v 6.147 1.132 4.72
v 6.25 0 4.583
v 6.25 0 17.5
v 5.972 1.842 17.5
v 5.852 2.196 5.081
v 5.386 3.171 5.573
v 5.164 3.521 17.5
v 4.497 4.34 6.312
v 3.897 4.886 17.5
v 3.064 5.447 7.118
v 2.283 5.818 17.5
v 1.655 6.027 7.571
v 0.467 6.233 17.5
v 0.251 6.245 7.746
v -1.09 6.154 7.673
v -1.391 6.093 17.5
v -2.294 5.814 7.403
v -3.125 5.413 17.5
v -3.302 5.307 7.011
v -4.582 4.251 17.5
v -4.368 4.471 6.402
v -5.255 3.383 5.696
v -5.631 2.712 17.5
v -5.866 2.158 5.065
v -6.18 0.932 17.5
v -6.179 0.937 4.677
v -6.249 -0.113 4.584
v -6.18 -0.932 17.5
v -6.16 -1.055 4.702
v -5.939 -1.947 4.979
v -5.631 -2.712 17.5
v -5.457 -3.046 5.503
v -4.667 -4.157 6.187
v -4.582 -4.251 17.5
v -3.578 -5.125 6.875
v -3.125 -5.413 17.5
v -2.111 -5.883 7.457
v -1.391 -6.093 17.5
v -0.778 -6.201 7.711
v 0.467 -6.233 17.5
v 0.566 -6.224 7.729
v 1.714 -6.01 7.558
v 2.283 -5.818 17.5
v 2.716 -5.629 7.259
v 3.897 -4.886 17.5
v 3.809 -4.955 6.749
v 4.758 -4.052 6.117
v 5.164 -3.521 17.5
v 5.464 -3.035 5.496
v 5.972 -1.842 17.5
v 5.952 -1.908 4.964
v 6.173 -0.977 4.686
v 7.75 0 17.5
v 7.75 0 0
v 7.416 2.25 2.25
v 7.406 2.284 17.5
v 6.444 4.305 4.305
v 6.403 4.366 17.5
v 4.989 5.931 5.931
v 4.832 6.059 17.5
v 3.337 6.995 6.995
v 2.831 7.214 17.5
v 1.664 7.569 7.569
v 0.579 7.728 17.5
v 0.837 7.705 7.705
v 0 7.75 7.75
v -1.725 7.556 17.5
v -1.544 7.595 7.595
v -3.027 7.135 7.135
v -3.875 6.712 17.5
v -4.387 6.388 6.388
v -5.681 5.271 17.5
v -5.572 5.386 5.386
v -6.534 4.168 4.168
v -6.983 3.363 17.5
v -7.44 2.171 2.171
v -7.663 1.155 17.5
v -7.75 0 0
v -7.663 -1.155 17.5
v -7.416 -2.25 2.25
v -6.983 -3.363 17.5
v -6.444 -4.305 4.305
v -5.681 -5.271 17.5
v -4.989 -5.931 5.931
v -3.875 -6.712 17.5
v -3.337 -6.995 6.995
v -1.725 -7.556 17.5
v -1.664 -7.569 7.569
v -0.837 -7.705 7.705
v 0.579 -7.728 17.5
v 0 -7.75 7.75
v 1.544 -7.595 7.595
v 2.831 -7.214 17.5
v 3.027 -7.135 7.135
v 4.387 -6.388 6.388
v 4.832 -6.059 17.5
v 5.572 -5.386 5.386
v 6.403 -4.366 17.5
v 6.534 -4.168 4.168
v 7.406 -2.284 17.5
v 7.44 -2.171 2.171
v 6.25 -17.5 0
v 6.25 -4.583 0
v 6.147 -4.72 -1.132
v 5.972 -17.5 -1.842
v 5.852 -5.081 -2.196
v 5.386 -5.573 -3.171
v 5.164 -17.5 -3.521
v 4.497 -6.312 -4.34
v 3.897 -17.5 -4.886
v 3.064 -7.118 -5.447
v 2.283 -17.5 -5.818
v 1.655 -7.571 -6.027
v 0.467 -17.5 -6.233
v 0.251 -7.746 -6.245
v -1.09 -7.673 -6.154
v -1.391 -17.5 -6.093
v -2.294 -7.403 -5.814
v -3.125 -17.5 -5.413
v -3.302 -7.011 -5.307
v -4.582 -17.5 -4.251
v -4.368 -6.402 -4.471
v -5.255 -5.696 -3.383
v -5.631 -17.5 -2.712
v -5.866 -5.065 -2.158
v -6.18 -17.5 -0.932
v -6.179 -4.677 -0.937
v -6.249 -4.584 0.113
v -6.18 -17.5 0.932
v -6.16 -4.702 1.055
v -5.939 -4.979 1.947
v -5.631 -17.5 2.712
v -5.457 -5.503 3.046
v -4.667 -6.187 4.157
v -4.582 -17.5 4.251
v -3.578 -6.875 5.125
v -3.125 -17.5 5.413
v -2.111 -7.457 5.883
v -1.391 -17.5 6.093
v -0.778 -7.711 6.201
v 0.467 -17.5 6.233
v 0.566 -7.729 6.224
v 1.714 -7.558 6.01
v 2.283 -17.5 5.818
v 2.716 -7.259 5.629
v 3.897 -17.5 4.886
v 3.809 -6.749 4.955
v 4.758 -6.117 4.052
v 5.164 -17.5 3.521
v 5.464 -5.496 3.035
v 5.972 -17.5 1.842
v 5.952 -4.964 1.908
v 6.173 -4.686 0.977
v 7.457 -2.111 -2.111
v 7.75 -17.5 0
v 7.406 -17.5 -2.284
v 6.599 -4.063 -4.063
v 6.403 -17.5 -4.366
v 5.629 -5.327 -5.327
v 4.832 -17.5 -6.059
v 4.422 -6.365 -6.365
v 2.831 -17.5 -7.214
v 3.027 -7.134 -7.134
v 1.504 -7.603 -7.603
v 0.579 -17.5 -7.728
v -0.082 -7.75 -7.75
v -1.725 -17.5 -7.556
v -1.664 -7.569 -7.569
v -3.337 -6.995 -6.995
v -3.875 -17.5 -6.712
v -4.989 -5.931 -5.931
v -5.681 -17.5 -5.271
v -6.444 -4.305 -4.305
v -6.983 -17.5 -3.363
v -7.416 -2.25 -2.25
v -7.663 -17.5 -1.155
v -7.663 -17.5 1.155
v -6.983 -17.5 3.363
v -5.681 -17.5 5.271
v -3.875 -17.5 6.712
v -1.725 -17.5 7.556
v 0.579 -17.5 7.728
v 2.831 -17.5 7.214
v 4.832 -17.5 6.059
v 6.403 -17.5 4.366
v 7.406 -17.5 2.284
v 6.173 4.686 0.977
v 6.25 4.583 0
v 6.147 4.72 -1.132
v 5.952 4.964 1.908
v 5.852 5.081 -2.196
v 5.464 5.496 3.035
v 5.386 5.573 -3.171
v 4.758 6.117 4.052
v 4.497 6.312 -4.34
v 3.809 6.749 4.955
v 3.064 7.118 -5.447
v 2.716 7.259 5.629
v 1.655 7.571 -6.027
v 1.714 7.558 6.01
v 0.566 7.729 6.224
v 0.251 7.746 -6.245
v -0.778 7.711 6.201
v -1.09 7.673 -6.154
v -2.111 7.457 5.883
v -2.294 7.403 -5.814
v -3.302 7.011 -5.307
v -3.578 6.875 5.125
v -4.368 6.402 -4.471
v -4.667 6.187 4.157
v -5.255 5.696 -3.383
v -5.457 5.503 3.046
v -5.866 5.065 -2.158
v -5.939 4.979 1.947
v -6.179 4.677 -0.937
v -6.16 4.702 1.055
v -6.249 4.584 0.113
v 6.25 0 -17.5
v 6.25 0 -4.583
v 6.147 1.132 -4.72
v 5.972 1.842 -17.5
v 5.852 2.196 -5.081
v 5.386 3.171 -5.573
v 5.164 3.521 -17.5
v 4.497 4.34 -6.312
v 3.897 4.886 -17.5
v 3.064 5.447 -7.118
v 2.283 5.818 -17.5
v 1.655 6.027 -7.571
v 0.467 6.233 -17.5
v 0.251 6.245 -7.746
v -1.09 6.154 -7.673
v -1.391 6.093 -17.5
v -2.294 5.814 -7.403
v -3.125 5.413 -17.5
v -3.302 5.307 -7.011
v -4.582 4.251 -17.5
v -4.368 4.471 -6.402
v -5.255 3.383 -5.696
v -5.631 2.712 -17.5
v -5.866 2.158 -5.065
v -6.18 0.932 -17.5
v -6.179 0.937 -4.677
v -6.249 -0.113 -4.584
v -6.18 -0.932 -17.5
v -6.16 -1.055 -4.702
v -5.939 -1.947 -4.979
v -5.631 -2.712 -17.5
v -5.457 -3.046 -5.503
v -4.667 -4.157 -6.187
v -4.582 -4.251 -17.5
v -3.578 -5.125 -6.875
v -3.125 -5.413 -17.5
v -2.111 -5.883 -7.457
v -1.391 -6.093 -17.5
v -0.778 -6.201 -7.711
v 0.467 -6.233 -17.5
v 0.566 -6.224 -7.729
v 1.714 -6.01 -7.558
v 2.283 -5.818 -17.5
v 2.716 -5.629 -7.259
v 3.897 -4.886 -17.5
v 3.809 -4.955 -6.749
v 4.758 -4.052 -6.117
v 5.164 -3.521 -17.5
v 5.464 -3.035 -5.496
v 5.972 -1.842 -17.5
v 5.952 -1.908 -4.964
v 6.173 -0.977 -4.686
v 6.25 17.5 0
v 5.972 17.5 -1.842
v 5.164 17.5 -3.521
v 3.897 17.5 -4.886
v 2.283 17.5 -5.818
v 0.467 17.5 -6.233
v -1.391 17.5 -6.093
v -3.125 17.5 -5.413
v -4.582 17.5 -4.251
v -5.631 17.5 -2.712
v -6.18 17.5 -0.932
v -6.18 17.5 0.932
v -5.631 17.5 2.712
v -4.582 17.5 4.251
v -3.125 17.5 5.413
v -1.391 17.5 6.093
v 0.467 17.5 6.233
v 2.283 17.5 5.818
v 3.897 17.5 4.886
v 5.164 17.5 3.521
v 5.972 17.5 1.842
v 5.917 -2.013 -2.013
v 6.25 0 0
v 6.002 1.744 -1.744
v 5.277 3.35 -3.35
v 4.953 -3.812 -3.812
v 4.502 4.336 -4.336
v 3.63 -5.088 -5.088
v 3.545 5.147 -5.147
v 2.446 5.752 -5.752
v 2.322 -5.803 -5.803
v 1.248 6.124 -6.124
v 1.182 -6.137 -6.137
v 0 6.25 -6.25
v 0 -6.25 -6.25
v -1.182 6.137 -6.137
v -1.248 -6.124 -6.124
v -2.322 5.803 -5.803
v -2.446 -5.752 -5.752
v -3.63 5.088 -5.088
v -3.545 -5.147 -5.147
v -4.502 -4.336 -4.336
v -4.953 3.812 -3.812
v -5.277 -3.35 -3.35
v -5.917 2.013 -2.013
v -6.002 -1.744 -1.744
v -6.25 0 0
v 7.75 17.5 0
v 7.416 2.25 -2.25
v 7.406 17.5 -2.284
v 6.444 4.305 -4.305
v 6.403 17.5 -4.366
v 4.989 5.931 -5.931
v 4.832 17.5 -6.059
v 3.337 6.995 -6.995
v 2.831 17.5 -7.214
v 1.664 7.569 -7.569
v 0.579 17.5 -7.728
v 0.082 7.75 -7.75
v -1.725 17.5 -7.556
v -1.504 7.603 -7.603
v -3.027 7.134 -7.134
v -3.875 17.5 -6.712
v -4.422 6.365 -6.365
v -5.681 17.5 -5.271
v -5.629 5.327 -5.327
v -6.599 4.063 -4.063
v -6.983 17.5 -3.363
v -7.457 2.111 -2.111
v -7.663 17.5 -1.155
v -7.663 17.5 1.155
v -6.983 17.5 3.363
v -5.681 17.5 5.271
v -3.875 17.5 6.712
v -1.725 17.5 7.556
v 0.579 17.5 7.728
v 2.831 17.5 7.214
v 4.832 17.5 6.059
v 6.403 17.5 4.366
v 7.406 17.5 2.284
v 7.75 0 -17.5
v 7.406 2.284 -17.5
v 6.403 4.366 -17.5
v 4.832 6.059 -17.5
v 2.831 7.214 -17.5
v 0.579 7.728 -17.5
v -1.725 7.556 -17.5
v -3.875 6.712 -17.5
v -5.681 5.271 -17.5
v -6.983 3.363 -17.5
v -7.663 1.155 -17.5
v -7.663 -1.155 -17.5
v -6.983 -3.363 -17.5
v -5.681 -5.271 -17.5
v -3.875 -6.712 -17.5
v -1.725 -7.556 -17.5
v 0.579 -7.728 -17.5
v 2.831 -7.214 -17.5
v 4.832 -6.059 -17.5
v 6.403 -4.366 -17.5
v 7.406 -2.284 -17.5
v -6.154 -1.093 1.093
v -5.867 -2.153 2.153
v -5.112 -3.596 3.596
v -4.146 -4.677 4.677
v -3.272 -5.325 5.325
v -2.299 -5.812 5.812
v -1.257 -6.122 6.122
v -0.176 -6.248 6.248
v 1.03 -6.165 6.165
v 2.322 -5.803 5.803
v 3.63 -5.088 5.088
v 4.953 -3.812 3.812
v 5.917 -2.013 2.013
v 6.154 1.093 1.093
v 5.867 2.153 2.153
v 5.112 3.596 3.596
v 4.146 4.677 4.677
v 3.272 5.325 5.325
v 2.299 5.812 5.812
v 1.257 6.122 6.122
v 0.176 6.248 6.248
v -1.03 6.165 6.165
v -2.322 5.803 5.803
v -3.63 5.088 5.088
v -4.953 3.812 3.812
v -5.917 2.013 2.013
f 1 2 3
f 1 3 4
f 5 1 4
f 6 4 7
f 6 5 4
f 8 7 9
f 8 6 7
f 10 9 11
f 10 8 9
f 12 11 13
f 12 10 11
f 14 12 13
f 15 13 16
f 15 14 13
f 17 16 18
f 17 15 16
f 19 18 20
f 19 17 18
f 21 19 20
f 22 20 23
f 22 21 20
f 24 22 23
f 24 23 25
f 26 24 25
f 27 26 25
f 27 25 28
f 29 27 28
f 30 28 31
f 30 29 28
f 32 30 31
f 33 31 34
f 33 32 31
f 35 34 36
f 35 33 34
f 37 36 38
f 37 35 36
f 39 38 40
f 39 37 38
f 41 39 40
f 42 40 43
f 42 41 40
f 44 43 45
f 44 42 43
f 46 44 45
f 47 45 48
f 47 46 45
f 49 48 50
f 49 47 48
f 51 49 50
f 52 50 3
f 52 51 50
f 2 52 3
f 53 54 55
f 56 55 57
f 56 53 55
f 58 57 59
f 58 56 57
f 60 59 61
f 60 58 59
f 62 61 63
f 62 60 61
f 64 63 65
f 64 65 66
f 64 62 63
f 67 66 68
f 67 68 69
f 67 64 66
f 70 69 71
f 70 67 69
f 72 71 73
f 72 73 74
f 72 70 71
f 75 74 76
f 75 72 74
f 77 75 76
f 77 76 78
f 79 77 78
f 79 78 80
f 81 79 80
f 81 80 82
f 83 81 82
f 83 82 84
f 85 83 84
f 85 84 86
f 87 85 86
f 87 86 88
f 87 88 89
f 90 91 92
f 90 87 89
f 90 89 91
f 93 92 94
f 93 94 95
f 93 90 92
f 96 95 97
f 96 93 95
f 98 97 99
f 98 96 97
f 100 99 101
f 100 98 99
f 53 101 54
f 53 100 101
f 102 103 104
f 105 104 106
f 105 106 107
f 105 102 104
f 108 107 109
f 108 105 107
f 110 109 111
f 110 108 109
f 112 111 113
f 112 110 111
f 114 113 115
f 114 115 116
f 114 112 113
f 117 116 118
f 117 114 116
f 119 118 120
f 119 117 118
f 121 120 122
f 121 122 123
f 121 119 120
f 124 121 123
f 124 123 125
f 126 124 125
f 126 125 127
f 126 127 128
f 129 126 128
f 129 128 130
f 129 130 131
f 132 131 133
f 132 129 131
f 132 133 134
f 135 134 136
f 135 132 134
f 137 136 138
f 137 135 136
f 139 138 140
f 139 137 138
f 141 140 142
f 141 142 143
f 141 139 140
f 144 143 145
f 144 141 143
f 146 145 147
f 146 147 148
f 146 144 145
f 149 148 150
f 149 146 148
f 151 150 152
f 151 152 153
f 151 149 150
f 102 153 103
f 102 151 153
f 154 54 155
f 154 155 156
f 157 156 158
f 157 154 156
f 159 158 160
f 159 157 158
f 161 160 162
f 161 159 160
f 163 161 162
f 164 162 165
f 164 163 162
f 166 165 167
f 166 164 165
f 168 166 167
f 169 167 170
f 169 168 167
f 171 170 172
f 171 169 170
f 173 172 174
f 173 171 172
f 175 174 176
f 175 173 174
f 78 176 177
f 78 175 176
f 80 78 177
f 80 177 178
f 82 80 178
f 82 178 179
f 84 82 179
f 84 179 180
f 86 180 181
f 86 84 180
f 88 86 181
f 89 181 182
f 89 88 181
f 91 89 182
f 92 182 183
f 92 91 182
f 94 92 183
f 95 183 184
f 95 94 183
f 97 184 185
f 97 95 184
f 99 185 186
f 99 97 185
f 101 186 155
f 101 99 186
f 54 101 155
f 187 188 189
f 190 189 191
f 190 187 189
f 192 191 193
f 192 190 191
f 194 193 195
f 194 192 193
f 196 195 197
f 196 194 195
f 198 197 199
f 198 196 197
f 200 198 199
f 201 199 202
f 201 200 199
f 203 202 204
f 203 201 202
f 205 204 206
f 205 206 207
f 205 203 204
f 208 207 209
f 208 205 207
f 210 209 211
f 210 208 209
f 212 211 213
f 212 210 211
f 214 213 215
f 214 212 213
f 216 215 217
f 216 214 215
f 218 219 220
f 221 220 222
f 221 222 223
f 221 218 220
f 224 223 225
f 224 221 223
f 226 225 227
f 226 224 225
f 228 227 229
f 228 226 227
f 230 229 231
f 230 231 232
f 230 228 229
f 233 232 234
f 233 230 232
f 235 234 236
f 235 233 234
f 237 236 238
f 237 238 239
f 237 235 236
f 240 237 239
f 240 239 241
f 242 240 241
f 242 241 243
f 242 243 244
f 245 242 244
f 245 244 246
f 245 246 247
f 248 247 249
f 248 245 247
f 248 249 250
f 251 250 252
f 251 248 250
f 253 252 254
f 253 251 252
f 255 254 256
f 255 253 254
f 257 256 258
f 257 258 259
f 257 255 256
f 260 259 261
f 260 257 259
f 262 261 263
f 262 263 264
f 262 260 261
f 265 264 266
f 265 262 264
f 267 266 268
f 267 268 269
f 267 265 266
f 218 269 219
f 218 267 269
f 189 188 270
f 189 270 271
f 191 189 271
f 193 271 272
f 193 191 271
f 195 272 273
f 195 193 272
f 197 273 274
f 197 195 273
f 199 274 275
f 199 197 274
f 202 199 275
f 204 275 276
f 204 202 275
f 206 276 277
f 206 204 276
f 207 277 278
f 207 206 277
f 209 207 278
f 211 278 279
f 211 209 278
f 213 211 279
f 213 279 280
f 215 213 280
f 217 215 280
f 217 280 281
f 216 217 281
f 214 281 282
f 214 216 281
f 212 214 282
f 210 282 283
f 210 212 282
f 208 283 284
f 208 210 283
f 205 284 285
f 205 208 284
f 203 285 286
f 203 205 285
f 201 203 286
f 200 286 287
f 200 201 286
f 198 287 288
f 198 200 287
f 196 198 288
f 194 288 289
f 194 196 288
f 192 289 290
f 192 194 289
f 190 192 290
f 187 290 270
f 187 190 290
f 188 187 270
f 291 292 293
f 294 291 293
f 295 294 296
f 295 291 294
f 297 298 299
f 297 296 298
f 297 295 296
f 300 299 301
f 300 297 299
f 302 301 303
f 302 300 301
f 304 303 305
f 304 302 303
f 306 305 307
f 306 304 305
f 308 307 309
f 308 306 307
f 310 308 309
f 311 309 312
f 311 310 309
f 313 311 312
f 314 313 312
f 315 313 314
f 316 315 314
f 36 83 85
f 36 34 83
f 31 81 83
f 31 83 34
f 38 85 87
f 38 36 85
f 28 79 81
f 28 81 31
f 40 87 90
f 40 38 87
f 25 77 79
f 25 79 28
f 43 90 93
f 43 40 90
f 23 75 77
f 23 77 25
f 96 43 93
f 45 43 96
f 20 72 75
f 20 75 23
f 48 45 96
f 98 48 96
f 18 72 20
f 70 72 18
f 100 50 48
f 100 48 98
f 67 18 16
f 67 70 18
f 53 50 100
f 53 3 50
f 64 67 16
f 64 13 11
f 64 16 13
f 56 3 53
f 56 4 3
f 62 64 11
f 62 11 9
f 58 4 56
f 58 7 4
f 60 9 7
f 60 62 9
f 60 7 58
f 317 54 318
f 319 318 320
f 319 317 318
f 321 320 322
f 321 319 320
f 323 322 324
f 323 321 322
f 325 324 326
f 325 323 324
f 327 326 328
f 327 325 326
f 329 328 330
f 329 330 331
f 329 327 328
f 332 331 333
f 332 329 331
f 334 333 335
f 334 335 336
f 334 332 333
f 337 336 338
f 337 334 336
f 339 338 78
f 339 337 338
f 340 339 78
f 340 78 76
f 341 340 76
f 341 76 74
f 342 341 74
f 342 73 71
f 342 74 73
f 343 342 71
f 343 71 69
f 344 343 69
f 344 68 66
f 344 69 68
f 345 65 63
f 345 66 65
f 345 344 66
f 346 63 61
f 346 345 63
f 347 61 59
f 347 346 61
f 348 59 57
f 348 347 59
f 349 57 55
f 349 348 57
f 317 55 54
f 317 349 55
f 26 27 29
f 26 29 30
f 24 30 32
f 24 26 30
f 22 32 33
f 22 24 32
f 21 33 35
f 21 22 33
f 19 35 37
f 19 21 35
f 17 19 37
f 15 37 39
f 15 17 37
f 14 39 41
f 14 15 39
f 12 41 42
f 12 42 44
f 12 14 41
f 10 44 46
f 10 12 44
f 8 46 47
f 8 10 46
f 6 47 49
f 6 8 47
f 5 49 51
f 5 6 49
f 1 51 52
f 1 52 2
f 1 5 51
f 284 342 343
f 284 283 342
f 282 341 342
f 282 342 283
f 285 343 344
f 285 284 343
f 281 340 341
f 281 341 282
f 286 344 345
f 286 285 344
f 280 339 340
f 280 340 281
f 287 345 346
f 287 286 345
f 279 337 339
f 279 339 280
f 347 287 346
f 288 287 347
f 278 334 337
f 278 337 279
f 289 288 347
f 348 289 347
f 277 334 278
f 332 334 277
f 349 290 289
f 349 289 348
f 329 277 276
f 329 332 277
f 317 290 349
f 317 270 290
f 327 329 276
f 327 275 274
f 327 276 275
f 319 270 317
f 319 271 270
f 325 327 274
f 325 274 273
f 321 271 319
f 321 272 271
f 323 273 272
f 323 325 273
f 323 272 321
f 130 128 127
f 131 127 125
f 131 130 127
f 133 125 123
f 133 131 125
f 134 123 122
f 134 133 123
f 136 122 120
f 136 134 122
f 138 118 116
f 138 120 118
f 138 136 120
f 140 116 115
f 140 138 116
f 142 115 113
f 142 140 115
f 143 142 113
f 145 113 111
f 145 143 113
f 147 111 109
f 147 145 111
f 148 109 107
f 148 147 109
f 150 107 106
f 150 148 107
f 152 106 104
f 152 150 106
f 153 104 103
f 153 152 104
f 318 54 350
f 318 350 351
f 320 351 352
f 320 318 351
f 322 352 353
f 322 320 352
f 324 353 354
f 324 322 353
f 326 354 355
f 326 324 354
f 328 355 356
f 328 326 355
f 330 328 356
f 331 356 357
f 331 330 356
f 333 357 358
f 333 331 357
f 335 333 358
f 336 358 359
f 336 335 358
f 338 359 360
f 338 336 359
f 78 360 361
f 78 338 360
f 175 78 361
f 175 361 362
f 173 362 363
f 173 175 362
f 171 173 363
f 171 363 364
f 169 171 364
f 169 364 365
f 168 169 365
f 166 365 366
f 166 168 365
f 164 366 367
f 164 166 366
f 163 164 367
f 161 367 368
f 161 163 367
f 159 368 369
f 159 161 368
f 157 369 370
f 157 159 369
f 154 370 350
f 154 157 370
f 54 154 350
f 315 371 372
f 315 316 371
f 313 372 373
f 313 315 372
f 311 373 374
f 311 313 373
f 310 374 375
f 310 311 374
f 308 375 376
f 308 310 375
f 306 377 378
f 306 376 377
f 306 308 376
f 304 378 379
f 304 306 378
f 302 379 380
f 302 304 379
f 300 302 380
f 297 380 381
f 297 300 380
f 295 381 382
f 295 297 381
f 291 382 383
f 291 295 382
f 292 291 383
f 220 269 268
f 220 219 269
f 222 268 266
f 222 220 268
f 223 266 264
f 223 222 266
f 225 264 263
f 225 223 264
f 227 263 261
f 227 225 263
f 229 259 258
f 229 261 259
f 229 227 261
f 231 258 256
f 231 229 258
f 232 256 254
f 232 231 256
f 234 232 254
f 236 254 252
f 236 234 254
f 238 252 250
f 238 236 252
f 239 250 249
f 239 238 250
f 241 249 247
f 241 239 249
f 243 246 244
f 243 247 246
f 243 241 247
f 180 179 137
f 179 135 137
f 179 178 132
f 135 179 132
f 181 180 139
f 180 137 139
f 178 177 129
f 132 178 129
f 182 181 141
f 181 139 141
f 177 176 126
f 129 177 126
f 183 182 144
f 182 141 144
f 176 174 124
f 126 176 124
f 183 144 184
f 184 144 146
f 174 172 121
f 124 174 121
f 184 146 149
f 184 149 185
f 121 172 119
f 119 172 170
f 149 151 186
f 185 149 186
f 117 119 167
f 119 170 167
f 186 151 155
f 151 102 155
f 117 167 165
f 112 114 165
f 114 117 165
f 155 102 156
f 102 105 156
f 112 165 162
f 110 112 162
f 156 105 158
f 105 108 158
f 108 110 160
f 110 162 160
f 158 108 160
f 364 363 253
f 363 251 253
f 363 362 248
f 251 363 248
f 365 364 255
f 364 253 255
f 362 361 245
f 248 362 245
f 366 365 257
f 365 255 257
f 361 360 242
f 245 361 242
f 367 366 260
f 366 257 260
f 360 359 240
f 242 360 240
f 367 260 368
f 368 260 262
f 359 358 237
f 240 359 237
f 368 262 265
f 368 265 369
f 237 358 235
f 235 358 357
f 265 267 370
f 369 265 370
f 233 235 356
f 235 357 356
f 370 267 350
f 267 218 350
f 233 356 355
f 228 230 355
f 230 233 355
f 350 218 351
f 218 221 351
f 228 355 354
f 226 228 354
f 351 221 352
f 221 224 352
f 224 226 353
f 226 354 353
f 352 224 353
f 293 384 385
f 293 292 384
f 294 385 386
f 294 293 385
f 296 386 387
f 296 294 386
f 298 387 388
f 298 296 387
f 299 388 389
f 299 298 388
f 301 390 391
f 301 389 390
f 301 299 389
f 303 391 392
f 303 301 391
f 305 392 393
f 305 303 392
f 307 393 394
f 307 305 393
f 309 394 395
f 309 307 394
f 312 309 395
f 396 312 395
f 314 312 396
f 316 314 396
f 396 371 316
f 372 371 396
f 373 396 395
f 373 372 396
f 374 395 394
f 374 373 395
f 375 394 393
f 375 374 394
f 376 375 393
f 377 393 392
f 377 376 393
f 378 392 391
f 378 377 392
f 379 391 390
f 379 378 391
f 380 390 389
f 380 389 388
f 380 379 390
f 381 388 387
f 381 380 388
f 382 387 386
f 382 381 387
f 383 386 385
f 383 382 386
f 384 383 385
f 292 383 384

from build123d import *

# Parameters (mm, degrees)
SKETCH1_R           = 15.5
SKETCH1_R_2         = 12.5
EXTRUDE_THIN1_DEPTH = 35
SKETCH2_R           = 15.5
SKETCH2_R_2         = 12.5
EXTRUDE_THIN2_DEPTH = 35
SCALE1_SCALE        = 0.5


with BuildPart() as part:
    # Sketch1 → Extrude-Thin1 (new, symmetric)
    with BuildSketch(Plane.XY):
        Circle(SKETCH1_R)
        Circle(SKETCH1_R_2, mode=Mode.SUBTRACT)
    extrude(amount=EXTRUDE_THIN1_DEPTH, both=True)

    # Sketch2 → Extrude-Thin2 (add, symmetric)
    with BuildSketch(Plane(origin=(0, 0, 0), x_dir=(1, 0, 0), z_dir=(0, 1, 0))):
        Circle(SKETCH2_R)
        Circle(SKETCH2_R_2, mode=Mode.SUBTRACT)
    extrude(amount=EXTRUDE_THIN2_DEPTH, both=True)


with BuildPart() as part_1:
    # Scale1: scaled about (0, 0, 0)
    add(part.part.scale(SCALE1_SCALE))


solid = part_1.part
